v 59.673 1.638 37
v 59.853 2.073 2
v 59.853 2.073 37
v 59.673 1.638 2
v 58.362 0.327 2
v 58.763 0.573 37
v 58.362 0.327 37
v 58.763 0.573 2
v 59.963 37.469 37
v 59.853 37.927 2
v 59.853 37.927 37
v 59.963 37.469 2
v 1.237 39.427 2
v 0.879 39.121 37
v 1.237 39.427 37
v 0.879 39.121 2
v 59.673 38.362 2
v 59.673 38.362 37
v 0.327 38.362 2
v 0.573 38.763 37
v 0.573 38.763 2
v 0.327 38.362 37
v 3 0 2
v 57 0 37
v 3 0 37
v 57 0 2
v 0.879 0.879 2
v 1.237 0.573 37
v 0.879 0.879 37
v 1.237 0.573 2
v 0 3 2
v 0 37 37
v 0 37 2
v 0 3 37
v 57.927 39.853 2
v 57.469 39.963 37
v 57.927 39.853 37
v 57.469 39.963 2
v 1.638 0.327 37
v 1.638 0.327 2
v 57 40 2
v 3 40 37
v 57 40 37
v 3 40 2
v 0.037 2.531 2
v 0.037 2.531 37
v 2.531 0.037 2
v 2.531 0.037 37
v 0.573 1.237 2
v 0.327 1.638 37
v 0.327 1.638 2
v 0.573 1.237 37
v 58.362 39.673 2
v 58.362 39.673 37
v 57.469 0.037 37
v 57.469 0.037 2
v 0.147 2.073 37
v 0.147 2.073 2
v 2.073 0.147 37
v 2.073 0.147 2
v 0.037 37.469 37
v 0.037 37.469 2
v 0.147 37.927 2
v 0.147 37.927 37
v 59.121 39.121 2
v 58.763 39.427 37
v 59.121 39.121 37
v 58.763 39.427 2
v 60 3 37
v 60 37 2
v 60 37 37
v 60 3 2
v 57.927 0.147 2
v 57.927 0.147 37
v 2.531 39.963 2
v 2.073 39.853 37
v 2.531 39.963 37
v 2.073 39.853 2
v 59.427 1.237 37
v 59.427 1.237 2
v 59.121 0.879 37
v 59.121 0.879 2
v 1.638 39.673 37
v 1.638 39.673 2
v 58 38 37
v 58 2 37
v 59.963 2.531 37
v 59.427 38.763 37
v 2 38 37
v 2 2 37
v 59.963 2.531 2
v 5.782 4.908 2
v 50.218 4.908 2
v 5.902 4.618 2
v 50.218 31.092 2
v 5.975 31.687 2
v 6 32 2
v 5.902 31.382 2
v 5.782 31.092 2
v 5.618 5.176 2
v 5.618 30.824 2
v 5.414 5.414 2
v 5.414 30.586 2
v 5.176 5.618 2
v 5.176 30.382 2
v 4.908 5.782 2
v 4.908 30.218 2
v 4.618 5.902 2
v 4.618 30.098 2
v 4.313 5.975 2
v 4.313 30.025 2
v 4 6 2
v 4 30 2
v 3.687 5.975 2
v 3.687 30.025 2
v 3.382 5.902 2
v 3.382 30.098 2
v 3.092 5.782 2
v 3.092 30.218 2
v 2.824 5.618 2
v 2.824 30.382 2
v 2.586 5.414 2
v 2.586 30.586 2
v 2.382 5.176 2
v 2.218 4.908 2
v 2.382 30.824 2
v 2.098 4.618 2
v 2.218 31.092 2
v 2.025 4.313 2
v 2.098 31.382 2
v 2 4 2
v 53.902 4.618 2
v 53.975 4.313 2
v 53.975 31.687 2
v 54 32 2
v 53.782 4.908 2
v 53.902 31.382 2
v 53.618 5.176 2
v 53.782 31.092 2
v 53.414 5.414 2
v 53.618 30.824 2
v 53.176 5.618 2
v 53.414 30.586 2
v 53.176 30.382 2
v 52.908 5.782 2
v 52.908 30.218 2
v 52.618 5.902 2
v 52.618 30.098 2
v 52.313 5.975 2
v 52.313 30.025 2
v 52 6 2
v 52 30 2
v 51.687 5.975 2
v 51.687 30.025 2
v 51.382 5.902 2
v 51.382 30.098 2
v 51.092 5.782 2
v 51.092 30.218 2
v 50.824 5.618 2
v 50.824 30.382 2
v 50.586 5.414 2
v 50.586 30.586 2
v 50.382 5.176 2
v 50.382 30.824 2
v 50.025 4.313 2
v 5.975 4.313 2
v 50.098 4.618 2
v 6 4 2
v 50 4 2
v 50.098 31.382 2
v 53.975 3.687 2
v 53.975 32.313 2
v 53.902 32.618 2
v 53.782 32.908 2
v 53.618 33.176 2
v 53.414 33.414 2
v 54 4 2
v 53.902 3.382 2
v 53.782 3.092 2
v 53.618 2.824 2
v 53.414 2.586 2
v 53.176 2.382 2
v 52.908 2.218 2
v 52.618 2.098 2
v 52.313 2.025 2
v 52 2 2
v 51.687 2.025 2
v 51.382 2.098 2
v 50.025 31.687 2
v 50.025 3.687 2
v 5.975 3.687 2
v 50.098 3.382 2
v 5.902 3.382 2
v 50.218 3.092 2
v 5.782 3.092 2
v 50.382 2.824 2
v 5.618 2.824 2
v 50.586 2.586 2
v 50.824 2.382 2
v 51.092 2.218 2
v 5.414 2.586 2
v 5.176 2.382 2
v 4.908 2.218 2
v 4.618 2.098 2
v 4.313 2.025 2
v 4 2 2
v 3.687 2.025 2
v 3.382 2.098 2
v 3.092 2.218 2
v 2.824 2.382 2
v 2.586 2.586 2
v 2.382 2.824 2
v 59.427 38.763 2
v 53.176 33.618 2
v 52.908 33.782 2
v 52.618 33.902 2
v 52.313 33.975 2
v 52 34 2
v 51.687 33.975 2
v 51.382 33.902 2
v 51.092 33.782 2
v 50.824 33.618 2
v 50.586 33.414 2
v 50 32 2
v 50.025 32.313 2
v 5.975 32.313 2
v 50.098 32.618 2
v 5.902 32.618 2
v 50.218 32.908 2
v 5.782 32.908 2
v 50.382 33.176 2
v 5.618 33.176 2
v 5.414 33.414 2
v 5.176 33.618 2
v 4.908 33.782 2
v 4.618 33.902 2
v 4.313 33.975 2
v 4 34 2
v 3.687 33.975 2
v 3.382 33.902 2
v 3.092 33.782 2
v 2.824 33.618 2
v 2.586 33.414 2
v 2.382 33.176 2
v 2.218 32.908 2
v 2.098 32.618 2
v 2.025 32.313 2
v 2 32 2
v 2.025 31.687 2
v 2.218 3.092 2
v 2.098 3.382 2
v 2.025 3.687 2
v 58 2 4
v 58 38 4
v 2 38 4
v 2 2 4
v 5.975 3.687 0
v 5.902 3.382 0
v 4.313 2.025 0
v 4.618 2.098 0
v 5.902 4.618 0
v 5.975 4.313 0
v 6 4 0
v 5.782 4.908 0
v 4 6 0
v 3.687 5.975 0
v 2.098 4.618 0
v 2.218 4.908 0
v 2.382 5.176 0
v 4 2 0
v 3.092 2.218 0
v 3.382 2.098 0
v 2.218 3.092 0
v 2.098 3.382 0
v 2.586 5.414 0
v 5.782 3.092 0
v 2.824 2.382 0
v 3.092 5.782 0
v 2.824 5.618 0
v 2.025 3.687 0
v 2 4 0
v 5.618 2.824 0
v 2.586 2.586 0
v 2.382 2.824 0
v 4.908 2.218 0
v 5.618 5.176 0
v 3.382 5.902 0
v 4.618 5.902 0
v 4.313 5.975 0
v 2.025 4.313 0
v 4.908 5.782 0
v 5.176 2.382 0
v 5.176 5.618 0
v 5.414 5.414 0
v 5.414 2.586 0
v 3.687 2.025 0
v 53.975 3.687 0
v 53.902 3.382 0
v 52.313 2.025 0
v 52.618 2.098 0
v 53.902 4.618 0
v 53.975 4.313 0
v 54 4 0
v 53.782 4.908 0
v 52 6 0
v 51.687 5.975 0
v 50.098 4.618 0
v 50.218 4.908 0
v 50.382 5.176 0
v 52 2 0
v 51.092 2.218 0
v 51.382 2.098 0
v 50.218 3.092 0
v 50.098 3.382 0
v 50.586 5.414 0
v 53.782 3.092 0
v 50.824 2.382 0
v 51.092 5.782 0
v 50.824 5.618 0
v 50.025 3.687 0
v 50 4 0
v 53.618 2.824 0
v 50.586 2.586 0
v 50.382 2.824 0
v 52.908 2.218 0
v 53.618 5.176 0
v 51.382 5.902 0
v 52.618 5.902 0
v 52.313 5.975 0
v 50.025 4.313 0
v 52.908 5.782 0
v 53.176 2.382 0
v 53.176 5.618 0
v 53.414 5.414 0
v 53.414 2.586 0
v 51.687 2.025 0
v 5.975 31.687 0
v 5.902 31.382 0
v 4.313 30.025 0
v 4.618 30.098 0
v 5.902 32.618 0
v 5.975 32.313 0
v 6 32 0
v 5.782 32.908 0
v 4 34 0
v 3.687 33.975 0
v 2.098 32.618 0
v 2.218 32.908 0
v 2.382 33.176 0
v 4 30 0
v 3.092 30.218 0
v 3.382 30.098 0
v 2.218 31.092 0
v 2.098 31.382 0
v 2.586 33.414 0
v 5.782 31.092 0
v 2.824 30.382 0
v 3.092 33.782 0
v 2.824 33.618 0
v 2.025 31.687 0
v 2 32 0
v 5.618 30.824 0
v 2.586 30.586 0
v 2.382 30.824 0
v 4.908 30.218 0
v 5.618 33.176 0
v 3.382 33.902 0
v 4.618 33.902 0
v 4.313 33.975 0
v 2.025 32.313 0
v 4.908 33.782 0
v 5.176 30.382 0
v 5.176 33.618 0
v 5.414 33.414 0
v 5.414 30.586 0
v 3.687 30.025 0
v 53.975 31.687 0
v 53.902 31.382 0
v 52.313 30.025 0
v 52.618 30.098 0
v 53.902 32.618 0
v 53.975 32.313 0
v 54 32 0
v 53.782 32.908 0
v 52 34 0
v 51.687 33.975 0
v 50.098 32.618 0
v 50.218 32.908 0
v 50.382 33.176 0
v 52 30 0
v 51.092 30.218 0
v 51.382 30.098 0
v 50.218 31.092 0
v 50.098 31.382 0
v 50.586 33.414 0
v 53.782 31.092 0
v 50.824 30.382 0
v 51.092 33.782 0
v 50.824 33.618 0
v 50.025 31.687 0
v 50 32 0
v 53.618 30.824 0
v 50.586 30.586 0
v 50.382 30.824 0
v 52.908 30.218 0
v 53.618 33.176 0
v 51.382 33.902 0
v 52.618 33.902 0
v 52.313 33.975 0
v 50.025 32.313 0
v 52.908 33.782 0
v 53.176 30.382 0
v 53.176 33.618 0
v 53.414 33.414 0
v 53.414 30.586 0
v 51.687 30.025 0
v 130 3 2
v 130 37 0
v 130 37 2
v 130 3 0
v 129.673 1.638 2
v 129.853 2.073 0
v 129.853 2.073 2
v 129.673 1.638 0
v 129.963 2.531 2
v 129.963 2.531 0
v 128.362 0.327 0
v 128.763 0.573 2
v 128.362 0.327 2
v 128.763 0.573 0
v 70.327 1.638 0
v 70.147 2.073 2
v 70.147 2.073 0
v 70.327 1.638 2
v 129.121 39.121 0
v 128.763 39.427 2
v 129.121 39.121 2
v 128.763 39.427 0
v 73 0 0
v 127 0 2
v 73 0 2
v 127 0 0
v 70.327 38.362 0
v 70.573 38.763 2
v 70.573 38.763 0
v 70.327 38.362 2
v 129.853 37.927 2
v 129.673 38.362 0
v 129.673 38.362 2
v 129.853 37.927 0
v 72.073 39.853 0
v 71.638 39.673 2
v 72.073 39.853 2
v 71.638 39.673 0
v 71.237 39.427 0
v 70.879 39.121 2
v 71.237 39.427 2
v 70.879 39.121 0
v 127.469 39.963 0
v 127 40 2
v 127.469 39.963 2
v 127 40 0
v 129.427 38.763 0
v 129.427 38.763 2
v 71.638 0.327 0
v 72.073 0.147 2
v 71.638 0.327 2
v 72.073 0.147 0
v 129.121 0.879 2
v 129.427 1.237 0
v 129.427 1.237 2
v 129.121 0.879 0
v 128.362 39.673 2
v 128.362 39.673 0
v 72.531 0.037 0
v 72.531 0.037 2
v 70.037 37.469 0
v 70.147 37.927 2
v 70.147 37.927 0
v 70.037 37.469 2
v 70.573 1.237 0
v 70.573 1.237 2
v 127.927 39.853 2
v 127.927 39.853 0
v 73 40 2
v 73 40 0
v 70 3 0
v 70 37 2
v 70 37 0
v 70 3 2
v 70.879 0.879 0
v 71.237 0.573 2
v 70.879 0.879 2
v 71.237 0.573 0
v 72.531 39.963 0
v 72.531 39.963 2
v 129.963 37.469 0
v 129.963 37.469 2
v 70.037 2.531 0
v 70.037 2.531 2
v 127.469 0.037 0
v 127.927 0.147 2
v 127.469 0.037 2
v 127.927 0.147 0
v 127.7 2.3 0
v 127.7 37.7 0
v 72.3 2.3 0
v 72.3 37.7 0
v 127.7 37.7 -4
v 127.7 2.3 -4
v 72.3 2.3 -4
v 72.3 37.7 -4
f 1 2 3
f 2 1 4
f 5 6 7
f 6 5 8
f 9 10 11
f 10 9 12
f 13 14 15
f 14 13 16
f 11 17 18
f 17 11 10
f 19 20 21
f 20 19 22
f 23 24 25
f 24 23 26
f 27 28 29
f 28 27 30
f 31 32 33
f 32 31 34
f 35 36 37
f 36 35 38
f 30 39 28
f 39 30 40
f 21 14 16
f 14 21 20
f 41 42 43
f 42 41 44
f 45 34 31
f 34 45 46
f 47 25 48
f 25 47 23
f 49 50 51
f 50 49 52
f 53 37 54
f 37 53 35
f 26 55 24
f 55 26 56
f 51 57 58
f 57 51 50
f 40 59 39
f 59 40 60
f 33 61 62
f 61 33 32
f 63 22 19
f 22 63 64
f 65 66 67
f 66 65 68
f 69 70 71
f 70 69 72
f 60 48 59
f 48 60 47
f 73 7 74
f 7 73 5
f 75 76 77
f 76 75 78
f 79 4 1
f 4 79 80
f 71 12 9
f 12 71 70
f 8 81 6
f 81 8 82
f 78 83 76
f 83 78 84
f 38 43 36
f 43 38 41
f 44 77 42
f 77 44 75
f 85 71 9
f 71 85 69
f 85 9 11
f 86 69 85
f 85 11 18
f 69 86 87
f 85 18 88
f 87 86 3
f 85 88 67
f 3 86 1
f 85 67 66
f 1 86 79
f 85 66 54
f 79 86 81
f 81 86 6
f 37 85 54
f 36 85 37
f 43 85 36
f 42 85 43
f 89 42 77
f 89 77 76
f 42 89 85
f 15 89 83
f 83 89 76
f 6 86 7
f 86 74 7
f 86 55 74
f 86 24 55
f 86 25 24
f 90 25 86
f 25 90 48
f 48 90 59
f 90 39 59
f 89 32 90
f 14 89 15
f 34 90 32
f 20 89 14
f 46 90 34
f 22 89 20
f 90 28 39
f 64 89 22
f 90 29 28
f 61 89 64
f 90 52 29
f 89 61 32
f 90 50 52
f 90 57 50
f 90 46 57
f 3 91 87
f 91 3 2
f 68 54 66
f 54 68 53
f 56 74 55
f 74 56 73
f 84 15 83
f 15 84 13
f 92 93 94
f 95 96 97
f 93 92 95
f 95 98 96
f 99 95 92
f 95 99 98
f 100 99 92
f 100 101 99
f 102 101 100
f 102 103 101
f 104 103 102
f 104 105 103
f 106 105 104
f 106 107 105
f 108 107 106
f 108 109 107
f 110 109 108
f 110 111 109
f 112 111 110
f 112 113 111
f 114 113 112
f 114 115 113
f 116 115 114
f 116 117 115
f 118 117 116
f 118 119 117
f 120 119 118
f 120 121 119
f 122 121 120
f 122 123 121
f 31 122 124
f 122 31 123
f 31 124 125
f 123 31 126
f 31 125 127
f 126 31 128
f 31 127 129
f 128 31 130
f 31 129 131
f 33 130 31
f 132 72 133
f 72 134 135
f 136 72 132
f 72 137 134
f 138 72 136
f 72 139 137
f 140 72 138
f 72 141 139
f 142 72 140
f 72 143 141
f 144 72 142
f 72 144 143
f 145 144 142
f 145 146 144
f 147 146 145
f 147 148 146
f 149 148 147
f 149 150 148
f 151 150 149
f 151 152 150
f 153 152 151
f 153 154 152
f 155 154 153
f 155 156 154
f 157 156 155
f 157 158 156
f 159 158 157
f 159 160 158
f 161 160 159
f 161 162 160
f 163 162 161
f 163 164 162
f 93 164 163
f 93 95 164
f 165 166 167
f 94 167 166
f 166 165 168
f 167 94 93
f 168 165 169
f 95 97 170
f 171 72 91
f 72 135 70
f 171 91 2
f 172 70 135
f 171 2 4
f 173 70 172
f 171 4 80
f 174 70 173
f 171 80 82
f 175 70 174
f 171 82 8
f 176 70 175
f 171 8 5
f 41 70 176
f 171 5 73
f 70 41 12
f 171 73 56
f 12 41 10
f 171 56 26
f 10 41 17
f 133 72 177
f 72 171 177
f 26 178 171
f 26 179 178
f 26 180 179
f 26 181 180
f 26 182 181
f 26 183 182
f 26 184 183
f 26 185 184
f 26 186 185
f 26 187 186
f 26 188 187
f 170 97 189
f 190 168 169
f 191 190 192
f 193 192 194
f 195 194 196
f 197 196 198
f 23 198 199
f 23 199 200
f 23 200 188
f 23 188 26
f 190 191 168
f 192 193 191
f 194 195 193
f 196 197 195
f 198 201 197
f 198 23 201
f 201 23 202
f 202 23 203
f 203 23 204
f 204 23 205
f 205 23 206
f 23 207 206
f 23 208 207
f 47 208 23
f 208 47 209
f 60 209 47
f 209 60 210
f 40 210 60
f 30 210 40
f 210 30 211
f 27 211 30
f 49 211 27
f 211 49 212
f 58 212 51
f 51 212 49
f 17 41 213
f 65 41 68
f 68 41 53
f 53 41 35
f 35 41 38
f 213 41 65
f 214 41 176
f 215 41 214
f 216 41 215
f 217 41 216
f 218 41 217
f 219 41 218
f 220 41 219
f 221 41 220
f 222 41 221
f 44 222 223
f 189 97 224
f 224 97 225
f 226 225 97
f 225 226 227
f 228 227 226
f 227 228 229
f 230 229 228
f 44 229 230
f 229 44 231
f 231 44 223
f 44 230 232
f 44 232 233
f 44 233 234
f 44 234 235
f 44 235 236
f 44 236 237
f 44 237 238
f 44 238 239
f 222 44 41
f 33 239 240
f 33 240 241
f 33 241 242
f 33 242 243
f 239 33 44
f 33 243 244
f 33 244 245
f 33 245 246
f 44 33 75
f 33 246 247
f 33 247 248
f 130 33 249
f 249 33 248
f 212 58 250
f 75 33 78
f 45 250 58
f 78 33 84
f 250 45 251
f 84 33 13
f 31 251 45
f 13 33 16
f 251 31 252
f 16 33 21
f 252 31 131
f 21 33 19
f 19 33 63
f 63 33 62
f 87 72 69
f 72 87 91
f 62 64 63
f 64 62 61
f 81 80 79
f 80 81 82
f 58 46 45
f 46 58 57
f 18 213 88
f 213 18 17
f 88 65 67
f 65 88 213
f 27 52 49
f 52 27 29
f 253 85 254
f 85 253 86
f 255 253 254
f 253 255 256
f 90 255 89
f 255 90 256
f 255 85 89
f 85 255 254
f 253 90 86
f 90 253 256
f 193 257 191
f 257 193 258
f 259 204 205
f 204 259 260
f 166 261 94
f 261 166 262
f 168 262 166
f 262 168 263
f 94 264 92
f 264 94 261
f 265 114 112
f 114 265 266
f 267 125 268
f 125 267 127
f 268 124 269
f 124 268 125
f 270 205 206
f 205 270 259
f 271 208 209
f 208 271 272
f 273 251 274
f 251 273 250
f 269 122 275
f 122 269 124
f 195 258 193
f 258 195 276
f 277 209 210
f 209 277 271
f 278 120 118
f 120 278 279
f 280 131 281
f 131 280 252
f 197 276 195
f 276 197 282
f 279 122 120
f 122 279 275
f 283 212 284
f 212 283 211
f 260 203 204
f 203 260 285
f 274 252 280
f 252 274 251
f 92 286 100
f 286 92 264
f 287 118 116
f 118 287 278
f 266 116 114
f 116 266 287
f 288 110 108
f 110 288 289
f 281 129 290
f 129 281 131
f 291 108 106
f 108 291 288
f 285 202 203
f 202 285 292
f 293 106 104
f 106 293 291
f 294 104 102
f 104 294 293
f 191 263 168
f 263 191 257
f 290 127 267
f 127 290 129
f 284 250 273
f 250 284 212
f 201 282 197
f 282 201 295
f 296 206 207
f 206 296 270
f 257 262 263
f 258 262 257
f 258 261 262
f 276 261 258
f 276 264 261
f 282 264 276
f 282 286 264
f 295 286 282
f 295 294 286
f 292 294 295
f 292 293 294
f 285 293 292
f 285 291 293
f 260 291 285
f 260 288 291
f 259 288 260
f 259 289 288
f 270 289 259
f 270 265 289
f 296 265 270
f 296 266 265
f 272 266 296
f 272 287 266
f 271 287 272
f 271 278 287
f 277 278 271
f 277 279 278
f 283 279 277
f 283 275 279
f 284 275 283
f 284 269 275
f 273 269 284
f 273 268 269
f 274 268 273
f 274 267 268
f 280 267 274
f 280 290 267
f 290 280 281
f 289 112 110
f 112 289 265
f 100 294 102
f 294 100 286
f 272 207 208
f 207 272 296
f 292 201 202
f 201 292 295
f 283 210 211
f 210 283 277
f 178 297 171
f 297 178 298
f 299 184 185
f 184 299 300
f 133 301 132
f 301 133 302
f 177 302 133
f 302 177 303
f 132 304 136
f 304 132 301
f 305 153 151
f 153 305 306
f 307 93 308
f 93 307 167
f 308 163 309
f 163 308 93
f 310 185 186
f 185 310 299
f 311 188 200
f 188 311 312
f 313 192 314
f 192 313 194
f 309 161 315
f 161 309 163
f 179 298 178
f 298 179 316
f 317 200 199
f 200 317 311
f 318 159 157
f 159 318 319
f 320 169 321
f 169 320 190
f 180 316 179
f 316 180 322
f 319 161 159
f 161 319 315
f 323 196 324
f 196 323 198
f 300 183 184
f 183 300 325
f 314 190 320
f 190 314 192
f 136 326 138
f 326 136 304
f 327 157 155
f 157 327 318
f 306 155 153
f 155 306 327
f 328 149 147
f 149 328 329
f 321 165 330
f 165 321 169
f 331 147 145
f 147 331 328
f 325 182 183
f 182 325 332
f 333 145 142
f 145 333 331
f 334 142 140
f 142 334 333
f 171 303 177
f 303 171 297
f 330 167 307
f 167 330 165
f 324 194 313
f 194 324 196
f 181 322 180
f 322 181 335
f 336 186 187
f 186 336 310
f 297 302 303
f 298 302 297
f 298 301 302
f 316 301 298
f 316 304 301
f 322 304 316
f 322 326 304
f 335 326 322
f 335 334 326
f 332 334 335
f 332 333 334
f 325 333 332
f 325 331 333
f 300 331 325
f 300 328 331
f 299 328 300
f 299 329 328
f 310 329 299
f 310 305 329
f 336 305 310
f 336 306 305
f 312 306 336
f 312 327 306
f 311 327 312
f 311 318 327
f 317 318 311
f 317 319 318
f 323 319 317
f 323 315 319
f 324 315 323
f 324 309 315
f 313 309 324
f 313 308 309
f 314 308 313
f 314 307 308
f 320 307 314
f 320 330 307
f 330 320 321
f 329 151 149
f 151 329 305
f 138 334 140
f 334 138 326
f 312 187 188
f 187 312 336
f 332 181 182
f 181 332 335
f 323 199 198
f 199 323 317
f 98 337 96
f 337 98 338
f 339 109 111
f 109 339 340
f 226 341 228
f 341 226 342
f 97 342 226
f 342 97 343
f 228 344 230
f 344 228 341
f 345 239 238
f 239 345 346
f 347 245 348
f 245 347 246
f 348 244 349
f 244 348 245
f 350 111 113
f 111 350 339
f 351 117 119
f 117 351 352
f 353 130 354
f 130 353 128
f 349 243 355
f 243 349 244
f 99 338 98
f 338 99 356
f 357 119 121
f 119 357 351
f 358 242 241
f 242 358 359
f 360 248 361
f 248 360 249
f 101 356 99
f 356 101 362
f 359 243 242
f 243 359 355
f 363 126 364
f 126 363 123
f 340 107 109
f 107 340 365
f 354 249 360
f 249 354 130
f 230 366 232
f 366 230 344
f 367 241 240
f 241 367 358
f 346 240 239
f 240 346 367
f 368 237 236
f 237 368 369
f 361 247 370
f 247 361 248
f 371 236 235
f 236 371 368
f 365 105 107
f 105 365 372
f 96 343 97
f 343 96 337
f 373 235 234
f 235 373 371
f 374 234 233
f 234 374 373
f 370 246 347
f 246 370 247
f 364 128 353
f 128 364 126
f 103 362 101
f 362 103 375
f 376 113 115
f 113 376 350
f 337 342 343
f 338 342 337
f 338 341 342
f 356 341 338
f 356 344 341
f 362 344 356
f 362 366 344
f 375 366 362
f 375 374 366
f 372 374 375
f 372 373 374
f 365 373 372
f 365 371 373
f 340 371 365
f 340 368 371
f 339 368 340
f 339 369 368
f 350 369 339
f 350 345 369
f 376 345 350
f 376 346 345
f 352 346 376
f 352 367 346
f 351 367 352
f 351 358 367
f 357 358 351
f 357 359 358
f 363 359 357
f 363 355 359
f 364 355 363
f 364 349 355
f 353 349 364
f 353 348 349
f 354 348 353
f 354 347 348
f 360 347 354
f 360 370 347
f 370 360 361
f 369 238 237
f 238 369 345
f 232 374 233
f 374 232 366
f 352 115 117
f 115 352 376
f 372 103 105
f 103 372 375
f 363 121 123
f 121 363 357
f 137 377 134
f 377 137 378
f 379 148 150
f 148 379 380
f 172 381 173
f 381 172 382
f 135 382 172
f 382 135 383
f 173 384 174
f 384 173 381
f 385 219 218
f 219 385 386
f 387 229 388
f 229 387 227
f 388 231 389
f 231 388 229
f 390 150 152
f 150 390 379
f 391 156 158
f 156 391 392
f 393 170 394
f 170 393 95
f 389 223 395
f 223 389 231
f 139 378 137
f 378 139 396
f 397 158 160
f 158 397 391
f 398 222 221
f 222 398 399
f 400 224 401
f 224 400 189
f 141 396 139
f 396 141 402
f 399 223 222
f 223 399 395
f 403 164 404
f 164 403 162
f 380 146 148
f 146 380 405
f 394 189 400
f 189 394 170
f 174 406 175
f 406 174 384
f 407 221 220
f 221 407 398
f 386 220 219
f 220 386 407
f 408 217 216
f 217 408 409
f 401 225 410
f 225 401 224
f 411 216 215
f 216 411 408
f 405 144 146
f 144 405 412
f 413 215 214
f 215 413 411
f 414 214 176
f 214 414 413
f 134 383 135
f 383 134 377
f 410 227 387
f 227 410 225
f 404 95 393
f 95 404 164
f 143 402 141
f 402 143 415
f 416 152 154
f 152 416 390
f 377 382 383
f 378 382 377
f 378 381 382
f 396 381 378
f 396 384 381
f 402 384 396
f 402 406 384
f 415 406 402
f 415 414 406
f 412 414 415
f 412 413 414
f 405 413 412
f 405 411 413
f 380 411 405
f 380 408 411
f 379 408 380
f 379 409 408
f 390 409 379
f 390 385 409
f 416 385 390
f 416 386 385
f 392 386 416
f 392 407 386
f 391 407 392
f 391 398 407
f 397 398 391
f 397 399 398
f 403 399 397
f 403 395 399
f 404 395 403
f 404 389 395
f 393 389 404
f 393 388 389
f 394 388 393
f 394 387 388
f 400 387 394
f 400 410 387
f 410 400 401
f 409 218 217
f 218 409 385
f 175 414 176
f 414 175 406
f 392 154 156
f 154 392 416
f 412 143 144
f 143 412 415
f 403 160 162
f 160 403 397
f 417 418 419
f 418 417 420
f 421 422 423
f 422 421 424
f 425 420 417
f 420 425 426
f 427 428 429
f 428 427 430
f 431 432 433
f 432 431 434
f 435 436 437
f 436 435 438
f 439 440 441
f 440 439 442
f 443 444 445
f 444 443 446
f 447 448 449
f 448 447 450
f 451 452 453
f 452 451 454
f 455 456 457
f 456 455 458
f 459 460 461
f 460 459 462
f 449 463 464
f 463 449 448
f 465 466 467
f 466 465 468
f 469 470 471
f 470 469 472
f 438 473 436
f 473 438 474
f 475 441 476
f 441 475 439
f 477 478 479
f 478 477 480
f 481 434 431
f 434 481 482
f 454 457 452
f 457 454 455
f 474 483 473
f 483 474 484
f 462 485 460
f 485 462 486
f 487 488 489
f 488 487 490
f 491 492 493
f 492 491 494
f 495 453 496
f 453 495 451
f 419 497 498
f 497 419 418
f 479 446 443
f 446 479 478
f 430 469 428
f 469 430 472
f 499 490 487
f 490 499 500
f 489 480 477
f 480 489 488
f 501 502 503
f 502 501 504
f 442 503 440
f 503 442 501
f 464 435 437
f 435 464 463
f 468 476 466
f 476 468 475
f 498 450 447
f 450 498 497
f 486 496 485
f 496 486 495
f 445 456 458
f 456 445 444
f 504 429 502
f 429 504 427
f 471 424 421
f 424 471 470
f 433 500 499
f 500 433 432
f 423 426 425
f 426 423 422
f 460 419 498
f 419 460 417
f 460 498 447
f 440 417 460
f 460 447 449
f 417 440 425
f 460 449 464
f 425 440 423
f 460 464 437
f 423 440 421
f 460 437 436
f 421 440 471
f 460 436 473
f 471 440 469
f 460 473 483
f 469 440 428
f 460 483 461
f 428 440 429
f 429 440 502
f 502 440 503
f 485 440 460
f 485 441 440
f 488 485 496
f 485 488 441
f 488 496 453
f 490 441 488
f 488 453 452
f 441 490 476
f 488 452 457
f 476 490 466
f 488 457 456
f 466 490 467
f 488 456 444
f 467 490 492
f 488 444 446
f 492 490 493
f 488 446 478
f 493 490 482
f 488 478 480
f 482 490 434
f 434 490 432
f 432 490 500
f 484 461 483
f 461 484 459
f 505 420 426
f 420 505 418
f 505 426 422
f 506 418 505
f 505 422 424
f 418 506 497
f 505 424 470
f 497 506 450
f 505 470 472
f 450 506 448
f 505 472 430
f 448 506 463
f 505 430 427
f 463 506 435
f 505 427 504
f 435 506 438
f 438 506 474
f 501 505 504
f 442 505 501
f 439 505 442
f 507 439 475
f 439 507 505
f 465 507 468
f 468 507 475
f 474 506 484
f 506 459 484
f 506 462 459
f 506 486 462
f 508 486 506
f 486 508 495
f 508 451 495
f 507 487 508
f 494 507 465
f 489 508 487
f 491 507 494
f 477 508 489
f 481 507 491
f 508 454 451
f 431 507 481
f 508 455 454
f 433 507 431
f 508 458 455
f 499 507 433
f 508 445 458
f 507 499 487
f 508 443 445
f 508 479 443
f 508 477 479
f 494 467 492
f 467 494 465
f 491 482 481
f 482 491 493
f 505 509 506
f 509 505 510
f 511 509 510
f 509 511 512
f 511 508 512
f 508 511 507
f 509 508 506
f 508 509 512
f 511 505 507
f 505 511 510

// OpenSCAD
// ============================================================
//  My First Forge Project — Parametric Storage Box
//  License: CC0 1.0 (Public Domain)
//
//  HOW TO CUSTOMIZE THIS FILE:
//  Parameters below have annotations that Forge reads to build
//  the control panel on the left side of the screen.
//
//  Annotation format:
//    variable = value; // [min:step:max] Label text
//    variable = value; // [option1, option2] Label text
//
//  Change anything in the sections below and click Preview!
// ============================================================

/* [Box Size] */

// Width of the box (left to right, in mm)
box_width = 60; // [20:5:200]

// Depth of the box (front to back, in mm)
box_depth = 40; // [20:5:150]

// Height of the box (in mm)
box_height = 35; // [15:5:150]

// Wall thickness (in mm)
wall_thickness = 2.0; // [1.0:0.5:5.0]

/* [Lid] */

// Include a lid
include_lid = "yes"; // [yes, no]

// Gap between box and lid so they slide on easily
lid_fit_gap = 0.3; // [0.1:0.1:0.8]

/* [Corners] */

// Round the corners? (nicer appearance, slightly slower to preview)
rounded_corners = "yes"; // [yes, no]

// Corner radius when rounded (in mm)
corner_radius = 3; // [1:1:15]

/* [Base] */

// Add rubber-foot bumps underneath
add_feet = "yes"; // [yes, no]

// Foot height (in mm)
foot_height = 2; // [1:1:5]

/* [Quality] */

// Render smoothness — lower is faster for quick previews
$fn = 40; // [16:8:128]

/* [Hidden] */
inner_w = box_width  - wall_thickness * 2;
inner_d = box_depth  - wall_thickness * 2;
inner_h = box_height - wall_thickness;
foot_dia = wall_thickness * 2;


// ---- modules ------------------------------------------------

module rounded_rect(w, d, h, r) {
    hull() {
        for (x = [r, w - r])
            for (y = [r, d - r])
                translate([x, y, 0])
                    cylinder(r = r, h = h);
    }
}

module box_body() {
    difference() {
        if (rounded_corners == "yes") {
            rounded_rect(box_width, box_depth, box_height, corner_radius);
        } else {
            cube([box_width, box_depth, box_height]);
        }

        translate([wall_thickness, wall_thickness, wall_thickness])
            cube([inner_w, inner_d, inner_h + 0.1]);
    }
}

module lid_body() {
    lid_h = wall_thickness + 4;
    skirt_depth = 4;

    union() {
        if (rounded_corners == "yes") {
            rounded_rect(box_width, box_depth, wall_thickness, corner_radius);
        } else {
            cube([box_width, box_depth, wall_thickness]);
        }

        translate([wall_thickness + lid_fit_gap,
                   wall_thickness + lid_fit_gap,
                   -skirt_depth])
            cube([
                inner_w - lid_fit_gap * 2,
                inner_d - lid_fit_gap * 2,
                skirt_depth + 0.1
            ]);
    }
}

module feet() {
    offsets = [
        [foot_dia, foot_dia],
        [box_width - foot_dia * 2, foot_dia],
        [foot_dia, box_depth - foot_dia * 2],
        [box_width - foot_dia * 2, box_depth - foot_dia * 2]
    ];
    for (pos = offsets)
        translate([pos[0], pos[1], -foot_height])
            cylinder(d = foot_dia, h = foot_height);
}


// ---- render -------------------------------------------------

translate([0, 0, add_feet == "yes" ? foot_height : 0]) {
    box_body();
    if (add_feet == "yes")
        feet();
}

if (include_lid == "yes") {
    translate([box_width + 10, 0, 0])
        lid_body();
}
